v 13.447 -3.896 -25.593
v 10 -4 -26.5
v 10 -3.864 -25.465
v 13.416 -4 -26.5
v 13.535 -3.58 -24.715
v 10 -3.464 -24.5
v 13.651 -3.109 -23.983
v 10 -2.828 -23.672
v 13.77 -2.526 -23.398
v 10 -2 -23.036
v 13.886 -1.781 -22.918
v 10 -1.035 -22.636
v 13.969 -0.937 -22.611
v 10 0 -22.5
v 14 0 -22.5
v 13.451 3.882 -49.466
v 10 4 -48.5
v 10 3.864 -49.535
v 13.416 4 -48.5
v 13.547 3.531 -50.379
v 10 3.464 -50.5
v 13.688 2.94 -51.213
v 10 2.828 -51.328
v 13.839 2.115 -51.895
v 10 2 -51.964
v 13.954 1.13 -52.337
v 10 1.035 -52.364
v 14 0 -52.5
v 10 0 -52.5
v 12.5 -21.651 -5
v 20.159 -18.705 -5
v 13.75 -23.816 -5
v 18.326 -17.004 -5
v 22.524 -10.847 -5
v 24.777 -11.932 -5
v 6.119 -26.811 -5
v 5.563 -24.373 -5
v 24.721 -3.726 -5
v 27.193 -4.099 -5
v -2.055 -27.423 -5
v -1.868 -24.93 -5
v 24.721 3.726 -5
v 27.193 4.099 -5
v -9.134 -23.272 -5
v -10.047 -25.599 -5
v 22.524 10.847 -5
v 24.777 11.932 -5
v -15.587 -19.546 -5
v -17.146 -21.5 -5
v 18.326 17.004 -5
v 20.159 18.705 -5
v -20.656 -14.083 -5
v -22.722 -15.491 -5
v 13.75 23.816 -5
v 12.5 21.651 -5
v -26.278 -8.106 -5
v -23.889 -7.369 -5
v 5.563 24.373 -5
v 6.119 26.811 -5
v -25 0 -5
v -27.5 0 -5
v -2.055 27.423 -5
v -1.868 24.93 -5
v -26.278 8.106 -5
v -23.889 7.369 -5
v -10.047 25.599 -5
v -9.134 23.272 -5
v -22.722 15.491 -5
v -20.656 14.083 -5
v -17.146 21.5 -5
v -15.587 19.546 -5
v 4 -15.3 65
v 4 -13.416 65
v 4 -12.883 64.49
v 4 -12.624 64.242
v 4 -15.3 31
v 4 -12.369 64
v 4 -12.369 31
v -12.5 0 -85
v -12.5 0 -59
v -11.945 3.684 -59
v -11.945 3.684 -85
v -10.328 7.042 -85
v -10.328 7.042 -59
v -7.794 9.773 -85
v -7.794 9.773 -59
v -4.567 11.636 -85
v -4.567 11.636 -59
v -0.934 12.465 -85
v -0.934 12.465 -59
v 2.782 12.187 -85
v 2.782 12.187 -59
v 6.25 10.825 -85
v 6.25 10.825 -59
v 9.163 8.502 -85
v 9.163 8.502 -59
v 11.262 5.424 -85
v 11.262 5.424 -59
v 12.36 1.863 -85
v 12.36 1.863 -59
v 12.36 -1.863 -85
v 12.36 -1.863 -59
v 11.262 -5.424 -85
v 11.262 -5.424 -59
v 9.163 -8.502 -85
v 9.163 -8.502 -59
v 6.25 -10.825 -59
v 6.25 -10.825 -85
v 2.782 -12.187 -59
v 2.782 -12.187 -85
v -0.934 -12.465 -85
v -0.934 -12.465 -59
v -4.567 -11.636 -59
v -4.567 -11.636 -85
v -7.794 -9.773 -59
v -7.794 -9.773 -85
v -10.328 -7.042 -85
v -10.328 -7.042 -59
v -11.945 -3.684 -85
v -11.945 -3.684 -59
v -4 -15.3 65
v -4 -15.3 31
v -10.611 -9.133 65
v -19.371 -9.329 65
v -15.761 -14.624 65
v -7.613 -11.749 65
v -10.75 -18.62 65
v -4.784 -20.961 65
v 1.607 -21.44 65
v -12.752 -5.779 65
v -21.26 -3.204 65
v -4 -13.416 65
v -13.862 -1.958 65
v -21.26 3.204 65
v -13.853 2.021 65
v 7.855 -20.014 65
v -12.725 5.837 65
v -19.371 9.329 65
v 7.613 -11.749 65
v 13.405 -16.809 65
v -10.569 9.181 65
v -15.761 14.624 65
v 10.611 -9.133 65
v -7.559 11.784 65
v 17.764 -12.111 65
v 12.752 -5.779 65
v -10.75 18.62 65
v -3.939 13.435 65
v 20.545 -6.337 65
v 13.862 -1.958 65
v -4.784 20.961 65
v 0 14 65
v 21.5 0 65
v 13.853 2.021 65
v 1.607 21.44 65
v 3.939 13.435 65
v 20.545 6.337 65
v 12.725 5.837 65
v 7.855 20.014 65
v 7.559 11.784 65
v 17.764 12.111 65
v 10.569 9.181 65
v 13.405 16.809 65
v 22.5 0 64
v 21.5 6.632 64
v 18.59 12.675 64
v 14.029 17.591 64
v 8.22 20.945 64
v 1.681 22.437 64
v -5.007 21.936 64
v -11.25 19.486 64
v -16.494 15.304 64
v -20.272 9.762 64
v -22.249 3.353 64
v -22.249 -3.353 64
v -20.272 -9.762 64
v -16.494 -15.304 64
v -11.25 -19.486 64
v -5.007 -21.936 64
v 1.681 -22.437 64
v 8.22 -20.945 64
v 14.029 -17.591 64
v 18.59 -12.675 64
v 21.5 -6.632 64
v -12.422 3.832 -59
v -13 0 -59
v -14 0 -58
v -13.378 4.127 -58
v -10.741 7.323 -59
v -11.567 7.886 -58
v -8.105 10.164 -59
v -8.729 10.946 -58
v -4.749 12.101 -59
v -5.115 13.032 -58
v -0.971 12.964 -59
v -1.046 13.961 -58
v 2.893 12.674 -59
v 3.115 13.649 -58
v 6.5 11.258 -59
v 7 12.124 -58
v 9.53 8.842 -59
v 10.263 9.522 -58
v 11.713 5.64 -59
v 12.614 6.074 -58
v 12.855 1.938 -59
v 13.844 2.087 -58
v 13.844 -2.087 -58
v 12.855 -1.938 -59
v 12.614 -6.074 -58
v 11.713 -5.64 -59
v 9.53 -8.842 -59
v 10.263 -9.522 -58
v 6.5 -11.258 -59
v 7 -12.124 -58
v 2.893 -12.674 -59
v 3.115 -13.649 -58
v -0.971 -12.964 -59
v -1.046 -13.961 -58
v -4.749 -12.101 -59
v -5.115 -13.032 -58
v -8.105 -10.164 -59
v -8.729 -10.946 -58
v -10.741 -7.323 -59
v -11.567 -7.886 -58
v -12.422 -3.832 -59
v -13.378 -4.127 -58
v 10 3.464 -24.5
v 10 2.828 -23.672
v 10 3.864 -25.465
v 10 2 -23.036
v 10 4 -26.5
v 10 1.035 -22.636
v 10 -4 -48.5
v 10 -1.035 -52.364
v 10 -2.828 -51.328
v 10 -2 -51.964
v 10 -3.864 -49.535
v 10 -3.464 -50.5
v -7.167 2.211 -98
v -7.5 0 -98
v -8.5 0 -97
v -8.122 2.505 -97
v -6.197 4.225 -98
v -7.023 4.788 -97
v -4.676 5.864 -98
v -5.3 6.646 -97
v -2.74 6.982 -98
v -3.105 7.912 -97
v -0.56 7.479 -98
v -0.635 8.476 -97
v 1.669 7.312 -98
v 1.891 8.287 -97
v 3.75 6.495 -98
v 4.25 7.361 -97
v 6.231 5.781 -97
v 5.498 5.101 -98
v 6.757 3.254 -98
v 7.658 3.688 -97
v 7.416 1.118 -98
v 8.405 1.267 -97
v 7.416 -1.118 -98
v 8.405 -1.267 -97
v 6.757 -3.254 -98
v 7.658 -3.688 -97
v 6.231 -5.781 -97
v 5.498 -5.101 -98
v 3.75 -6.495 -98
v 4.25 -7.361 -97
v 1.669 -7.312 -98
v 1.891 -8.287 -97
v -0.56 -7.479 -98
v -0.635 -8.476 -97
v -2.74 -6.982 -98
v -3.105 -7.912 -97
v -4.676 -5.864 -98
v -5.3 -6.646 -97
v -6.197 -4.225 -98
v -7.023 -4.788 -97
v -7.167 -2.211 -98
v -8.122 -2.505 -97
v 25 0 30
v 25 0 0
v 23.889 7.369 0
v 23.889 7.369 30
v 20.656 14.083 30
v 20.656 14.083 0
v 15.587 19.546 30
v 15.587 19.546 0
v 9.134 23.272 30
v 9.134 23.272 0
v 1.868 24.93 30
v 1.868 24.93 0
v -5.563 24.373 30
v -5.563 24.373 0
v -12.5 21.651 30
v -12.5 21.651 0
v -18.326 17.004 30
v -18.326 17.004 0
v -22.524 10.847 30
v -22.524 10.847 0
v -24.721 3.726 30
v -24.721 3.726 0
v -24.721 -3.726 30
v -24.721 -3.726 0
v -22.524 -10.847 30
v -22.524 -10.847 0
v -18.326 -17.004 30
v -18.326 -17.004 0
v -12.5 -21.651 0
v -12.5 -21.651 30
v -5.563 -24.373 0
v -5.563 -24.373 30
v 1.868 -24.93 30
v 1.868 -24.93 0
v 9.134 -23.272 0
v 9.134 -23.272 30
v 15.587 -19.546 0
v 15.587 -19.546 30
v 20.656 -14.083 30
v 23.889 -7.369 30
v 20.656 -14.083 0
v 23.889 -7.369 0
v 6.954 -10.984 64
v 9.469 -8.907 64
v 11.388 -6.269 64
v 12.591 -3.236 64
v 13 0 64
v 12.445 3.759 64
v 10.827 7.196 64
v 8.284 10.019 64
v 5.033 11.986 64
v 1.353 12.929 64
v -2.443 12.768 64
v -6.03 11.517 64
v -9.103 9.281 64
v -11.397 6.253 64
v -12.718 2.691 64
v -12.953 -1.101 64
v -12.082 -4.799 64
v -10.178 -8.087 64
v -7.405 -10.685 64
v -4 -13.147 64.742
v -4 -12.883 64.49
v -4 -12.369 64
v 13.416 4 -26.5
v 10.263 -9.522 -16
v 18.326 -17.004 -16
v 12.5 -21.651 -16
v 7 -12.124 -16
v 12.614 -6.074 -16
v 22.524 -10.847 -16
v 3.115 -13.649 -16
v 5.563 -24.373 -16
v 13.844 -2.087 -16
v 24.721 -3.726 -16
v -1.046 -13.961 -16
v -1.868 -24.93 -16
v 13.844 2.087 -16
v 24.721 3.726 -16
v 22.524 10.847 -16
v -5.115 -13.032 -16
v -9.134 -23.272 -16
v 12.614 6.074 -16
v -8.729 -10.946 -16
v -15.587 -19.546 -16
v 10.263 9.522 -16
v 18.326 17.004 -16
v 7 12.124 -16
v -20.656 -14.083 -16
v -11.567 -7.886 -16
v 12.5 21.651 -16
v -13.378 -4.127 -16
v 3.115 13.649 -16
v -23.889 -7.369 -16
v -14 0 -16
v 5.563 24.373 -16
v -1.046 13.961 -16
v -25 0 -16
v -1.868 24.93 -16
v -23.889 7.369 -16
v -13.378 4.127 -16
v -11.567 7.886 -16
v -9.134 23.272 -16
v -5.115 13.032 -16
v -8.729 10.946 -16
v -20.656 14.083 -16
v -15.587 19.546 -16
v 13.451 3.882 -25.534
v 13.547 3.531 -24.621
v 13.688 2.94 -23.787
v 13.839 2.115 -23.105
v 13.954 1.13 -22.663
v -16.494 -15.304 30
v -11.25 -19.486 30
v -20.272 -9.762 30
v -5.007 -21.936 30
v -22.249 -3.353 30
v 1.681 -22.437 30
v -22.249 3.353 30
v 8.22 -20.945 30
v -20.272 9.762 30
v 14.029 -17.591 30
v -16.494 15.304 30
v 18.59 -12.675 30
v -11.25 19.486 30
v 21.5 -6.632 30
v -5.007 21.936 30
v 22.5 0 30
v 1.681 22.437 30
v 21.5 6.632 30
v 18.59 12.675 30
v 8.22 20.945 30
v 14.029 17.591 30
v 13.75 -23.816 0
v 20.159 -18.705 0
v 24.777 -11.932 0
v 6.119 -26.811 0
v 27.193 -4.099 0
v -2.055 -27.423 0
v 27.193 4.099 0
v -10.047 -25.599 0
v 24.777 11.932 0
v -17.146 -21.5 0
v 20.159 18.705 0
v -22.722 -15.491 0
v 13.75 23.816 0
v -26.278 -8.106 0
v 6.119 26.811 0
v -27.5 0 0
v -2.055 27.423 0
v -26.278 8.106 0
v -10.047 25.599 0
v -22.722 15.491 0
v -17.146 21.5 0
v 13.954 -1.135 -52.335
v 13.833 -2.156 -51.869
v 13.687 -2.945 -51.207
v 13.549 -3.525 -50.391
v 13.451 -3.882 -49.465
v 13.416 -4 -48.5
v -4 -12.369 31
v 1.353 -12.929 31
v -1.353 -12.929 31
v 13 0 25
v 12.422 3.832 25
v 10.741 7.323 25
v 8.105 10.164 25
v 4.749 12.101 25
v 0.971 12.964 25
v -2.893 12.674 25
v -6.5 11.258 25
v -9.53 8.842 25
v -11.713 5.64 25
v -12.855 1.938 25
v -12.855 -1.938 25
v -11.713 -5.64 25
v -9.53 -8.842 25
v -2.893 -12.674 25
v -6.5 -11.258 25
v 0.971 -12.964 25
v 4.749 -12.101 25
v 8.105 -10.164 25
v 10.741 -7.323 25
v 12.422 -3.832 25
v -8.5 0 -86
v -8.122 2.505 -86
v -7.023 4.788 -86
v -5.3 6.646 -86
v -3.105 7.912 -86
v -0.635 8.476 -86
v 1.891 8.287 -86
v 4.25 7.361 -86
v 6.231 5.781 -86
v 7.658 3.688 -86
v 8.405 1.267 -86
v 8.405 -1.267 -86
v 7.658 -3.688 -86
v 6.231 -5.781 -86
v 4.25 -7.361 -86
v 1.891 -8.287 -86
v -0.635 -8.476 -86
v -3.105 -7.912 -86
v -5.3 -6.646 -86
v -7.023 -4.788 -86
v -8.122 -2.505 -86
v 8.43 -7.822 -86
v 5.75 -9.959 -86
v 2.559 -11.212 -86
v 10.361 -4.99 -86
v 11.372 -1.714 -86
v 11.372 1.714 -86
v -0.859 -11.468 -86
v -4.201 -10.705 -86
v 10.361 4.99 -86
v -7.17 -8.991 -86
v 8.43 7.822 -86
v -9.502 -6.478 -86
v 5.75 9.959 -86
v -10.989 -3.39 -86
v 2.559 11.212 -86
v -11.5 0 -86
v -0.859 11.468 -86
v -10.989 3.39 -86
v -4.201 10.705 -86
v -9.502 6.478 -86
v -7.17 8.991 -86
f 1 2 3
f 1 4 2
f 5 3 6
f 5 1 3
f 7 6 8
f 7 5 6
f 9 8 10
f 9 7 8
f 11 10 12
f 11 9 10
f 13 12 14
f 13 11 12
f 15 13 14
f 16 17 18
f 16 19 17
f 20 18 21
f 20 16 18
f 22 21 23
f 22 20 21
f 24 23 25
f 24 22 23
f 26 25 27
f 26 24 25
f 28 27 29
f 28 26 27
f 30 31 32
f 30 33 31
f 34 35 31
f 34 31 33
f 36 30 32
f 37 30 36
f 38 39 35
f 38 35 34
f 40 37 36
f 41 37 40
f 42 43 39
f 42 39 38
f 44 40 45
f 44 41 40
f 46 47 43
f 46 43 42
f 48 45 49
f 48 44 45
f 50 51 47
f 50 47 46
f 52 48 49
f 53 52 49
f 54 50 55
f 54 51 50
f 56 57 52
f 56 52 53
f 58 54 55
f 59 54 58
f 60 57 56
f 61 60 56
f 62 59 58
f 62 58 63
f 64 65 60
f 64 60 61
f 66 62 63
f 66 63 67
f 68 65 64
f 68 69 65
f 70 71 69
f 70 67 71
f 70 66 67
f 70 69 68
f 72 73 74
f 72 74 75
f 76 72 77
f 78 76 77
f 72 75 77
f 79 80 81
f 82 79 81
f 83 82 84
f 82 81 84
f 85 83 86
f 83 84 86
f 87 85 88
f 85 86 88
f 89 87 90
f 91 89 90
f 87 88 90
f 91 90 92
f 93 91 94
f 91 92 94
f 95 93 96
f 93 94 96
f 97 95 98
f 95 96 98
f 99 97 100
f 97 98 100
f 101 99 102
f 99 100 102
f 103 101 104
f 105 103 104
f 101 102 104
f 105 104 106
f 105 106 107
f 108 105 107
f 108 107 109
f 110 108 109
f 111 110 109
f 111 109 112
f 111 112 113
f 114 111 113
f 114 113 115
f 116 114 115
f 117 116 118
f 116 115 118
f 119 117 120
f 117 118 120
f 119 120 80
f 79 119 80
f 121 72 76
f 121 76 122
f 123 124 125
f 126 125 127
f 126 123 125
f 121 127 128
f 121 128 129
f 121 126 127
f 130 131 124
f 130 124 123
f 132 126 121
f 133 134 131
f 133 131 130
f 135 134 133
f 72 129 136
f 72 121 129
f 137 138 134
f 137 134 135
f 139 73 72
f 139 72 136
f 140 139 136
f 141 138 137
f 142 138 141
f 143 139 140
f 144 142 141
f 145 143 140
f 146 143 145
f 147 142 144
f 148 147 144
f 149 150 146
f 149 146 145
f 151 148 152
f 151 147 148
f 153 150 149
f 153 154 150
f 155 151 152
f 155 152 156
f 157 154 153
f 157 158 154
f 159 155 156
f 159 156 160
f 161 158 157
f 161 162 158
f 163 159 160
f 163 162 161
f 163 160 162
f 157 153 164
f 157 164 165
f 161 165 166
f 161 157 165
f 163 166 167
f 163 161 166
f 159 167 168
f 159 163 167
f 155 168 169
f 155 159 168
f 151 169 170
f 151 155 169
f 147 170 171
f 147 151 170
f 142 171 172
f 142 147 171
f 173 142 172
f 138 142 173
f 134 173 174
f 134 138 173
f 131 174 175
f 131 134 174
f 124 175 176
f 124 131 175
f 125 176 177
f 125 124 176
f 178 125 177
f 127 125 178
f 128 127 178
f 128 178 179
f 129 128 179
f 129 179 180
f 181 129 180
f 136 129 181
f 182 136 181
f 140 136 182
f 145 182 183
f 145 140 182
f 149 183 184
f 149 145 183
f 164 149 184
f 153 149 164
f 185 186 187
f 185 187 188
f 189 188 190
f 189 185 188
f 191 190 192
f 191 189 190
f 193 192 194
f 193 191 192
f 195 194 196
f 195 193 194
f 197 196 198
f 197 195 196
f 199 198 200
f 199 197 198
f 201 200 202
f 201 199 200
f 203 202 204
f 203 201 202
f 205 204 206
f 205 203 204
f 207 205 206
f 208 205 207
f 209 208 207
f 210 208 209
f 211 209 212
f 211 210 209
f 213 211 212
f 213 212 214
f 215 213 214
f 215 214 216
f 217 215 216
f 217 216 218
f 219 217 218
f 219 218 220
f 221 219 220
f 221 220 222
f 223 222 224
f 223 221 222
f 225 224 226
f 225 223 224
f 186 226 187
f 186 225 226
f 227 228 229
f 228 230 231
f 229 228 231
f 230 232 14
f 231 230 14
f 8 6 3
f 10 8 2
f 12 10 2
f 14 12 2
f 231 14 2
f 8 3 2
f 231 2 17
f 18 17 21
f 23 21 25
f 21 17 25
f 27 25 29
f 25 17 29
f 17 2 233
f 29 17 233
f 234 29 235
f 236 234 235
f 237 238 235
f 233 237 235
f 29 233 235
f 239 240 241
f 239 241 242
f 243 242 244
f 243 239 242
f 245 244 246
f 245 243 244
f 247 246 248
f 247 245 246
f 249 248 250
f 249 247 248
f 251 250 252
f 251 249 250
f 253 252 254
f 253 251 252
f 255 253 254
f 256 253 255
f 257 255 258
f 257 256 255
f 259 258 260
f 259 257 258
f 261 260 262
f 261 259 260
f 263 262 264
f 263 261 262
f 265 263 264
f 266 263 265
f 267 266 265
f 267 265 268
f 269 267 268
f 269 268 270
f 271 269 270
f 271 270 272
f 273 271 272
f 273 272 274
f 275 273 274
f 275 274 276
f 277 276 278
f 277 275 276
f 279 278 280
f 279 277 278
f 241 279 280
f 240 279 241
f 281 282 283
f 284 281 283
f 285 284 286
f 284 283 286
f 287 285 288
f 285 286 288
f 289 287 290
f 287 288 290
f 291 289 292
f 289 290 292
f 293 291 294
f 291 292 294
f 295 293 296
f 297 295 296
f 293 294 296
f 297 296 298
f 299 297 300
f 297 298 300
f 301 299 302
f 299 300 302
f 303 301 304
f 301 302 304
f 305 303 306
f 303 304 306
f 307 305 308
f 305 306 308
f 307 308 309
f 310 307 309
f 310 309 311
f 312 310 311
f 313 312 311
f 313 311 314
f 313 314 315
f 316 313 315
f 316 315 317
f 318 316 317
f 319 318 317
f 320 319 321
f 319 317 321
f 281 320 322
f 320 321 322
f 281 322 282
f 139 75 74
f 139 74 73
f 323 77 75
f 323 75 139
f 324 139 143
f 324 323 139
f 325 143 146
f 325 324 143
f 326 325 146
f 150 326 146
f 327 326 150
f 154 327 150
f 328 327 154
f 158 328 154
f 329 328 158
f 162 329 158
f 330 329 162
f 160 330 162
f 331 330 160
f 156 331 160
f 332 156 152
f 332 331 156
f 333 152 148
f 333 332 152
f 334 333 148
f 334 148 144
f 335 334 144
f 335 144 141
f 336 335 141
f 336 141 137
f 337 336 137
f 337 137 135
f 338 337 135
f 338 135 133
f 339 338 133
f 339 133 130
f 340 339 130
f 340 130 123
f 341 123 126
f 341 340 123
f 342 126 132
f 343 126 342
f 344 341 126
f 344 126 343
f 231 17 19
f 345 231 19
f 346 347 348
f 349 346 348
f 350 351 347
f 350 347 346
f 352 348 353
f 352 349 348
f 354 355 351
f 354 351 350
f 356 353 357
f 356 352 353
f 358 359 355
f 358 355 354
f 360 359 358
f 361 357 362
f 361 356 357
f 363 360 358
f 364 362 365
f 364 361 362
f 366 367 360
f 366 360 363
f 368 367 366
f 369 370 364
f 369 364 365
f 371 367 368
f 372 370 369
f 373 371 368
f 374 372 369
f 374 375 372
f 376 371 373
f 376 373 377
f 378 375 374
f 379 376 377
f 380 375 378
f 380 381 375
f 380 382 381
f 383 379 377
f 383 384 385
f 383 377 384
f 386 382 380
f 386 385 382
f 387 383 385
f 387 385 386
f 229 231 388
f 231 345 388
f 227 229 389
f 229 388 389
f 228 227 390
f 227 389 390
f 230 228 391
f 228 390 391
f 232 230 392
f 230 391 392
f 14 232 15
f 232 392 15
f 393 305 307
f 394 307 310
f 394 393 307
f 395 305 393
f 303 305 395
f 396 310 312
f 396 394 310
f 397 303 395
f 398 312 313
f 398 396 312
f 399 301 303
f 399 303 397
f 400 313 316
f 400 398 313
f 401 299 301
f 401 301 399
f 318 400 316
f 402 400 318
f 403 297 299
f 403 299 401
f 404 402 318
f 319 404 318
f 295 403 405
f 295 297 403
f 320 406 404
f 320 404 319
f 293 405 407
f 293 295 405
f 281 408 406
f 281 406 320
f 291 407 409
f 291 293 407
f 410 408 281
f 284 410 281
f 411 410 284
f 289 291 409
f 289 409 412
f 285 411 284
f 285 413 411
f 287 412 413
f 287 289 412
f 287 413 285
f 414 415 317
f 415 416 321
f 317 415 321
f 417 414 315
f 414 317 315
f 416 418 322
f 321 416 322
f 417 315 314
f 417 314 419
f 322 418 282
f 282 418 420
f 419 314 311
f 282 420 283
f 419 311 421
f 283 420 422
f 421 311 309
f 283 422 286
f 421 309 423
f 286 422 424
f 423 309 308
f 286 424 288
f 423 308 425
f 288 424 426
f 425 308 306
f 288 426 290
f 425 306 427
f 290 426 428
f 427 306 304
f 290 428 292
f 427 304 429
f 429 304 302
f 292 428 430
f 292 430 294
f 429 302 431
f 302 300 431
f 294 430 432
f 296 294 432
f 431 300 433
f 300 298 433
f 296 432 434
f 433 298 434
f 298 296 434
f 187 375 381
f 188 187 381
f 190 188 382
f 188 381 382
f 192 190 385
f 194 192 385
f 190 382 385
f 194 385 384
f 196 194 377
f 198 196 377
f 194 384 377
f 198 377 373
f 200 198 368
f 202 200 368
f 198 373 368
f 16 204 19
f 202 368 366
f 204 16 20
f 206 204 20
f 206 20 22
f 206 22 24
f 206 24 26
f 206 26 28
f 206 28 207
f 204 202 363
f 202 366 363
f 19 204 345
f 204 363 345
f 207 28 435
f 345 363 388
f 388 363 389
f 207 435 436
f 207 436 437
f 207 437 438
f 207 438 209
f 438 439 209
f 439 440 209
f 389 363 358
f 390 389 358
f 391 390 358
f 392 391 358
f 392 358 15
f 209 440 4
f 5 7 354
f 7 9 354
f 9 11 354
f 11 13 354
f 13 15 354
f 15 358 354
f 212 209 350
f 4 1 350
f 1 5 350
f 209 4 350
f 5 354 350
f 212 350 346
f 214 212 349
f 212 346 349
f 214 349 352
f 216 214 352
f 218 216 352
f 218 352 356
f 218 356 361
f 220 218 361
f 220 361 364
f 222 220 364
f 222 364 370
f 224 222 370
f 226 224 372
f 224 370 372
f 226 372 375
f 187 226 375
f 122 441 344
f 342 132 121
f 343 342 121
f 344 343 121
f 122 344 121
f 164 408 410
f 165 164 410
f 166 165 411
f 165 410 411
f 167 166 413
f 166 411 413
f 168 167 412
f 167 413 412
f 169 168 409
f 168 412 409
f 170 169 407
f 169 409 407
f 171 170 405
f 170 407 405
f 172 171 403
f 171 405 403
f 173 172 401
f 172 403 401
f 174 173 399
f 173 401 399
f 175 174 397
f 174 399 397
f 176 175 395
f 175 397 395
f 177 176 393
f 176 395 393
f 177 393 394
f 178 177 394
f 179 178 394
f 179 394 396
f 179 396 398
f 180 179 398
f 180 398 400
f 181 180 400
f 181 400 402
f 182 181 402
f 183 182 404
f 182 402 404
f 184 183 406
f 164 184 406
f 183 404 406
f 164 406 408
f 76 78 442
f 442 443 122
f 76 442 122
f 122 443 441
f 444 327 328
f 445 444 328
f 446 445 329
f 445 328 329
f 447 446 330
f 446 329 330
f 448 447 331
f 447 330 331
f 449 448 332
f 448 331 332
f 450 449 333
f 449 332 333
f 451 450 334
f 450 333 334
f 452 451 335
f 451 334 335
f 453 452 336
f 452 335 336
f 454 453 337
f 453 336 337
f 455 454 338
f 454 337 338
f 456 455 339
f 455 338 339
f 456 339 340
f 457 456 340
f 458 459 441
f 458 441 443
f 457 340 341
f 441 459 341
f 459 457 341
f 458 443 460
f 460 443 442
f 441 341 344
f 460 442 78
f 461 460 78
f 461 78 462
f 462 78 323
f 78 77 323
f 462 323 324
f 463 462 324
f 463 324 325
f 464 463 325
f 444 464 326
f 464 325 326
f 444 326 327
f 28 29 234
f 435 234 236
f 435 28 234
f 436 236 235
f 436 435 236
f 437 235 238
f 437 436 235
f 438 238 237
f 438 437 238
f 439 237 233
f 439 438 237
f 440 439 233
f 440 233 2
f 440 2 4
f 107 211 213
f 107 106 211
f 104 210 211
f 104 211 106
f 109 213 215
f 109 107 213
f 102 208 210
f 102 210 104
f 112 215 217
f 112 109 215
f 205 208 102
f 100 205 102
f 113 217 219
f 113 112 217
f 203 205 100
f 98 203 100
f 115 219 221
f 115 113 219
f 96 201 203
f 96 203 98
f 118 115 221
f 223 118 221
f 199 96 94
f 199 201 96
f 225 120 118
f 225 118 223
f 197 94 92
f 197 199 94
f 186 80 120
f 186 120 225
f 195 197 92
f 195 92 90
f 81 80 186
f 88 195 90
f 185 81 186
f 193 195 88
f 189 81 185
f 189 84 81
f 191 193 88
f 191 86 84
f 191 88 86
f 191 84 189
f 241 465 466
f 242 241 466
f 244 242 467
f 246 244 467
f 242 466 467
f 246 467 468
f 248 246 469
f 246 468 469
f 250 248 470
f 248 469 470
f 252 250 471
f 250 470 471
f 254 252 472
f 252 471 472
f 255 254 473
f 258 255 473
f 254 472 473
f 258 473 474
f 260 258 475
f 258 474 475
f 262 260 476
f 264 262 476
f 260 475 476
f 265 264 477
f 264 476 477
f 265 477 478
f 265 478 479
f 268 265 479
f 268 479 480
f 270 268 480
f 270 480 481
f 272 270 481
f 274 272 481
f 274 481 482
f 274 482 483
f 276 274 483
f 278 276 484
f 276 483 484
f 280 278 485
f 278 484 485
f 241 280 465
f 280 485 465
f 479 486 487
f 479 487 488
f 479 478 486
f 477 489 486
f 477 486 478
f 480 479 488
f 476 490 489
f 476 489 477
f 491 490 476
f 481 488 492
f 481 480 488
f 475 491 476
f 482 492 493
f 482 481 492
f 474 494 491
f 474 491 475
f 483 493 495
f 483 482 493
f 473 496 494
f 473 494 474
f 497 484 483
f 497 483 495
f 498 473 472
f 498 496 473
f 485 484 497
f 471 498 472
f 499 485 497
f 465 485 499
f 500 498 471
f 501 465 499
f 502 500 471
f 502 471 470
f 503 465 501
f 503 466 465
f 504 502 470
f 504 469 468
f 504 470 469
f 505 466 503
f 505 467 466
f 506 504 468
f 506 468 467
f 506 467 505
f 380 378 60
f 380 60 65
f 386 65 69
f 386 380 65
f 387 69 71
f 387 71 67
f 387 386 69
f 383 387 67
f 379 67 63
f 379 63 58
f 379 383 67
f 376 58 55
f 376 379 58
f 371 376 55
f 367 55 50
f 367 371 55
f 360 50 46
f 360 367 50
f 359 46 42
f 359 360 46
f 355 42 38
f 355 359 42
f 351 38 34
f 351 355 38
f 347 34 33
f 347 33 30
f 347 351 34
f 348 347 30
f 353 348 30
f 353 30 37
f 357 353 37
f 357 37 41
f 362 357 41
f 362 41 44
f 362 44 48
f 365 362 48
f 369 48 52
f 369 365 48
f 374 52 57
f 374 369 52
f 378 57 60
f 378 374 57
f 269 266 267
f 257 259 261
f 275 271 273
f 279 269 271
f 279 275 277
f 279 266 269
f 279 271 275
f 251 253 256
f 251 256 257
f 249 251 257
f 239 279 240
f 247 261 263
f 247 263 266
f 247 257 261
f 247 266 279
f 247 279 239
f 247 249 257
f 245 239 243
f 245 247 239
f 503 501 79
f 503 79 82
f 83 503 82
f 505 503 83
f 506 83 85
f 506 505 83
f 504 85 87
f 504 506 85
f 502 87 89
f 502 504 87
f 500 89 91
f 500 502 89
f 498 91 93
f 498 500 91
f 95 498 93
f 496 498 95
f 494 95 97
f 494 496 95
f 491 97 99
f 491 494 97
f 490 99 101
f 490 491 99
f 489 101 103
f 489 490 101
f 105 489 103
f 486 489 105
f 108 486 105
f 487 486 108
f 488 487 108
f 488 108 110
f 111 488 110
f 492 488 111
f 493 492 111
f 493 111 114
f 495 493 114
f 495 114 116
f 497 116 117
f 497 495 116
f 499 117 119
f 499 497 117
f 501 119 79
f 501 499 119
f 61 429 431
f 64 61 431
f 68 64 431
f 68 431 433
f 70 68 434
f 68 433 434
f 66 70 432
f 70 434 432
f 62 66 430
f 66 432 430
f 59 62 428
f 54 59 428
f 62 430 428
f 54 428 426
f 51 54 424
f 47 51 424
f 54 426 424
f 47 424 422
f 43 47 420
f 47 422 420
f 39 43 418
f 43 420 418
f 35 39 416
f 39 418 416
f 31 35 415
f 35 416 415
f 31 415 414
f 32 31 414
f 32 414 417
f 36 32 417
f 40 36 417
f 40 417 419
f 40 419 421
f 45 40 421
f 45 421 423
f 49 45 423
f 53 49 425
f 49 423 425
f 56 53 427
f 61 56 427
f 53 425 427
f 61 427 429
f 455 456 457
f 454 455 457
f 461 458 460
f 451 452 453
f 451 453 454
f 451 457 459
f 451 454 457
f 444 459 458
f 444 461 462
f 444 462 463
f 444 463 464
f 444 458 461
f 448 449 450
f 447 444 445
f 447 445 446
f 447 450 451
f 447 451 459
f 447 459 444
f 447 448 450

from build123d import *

# Parameters (mm, degrees)
SKETCH_1_R               = 25
EXTRUDE_1_DEPTH          = 30
SKETCH_2_R               = 27.5
EXTRUDE_2_DEPTH          = 5
EXTRUDE_START            = 11
SKETCH_3_R               = 25
EXTRUDE_3_DEPTH          = 11
SKETCH_4_R               = 14
EXTRUDE_4_DEPTH          = 43
SKETCH_5_R               = 12.5
EXTRUDE_5_DEPTH          = 27
SKETCH_6_R               = 8.5
EXTRUDE_6_DEPTH          = 12
CUT_EXTRUDE_1_DEPTH      = 4
CUT_EXTRUDE_1_DEPTH_BACK = 4
SKETCH_7_W               = 4
SKETCH_7_H               = 30
FILLET_1_R               = 4
CHAMFER_1_SIZE           = 1
SKETCH_8_R               = 22.5
EXTRUDE_7_DEPTH          = 35
CHAMFER_2_SIZE           = 1
SKETCH_9_R               = 13
CUT_EXTRUDE_2_DEPTH      = 40
CHAMFER_3_SIZE           = 1
CUT_EXTRUDE_3_DEPTH      = 34


with BuildPart() as part:
    # 草图1 → 凸台-拉伸1 (new body)
    with BuildSketch(Plane.XY):
        Circle(SKETCH_1_R)
    extrude(amount=EXTRUDE_1_DEPTH)

    # 草图2 → 凸台-拉伸2 (add)
    with BuildSketch(Plane(origin=(0, 0, 0), x_dir=(-1, 0, 0), z_dir=(0, 0, -1))):
        Circle(SKETCH_2_R)
    extrude(amount=EXTRUDE_2_DEPTH)

    # 草图3 → 凸台-拉伸3 (add)
    with BuildSketch(Plane(origin=(0, 0, -5), x_dir=(-1, 0, 0), z_dir=(0, 0, -1)).offset(EXTRUDE_START)):
        Circle(SKETCH_3_R)
    extrude(amount=-EXTRUDE_3_DEPTH)

    # 草图4 → 凸台-拉伸4 (add)
    with BuildSketch(Plane(origin=(0, 0, -16), x_dir=(-1, 0, 0), z_dir=(0, 0, -1))):
        Circle(SKETCH_4_R)
    extrude(amount=EXTRUDE_4_DEPTH)

    # 草图5 → 凸台-拉伸5 (add)
    with BuildSketch(Plane(origin=(0, 0, -59), x_dir=(-1, 0, 0), z_dir=(0, 0, -1))):
        Circle(SKETCH_5_R)
    extrude(amount=EXTRUDE_5_DEPTH)

    # 草图6 → 凸台-拉伸6 (add)
    with BuildSketch(Plane(origin=(0, 0, -86), x_dir=(-1, 0, 0), z_dir=(0, 0, -1))):
        Circle(SKETCH_6_R)
    extrude(amount=EXTRUDE_6_DEPTH)

    # 草图7 → 切除-拉伸1 (cut, two sides: drawn at the far end of the back side and taken through both)
    with BuildSketch(Plane(origin=(0, 0, 0), x_dir=(1, 0, 0), z_dir=(0, 1, 0)).offset(-CUT_EXTRUDE_1_DEPTH_BACK)):
        with Locations((12, 37.5)):
            Rectangle(SKETCH_7_W, SKETCH_7_H)
    extrude(amount=CUT_EXTRUDE_1_DEPTH + CUT_EXTRUDE_1_DEPTH_BACK, mode=Mode.SUBTRACT)

    # 圆角1
    fillet_1_edges = [part.edges().sort_by_distance(p)[0] for p in [
        (11.708203932, 4, -22.5),
        (11.708203932, -4, -22.5),
        (11.708203932, -4, -52.5),
        (11.708203932, 4, -52.5),
    ]]
    fillet(fillet_1_edges, radius=FILLET_1_R - 0.0001)  # a hair under: the kernel refuses the full size

    # 倒角1
    chamfer_1_edges = [part.edges().sort_by_distance(p)[0] for p in [
        (14, 0, -59),
        (12.5, 0, -86),
        (8.5, 0, -98),
    ]]
    chamfer(chamfer_1_edges, length=CHAMFER_1_SIZE)

    # 草图8 → 凸台-拉伸7 (add)
    with BuildSketch(Plane.XY.offset(30)):
        Circle(SKETCH_8_R)
    extrude(amount=EXTRUDE_7_DEPTH)

    # 倒角2
    chamfer_2_edges = [part.edges().sort_by_distance(p)[0] for p in [
        (-22.5, 0, 65),
    ]]
    chamfer(chamfer_2_edges, length=CHAMFER_2_SIZE)

    # 草图9 → 切除-拉伸2 (cut)
    with BuildSketch(Plane.XY.offset(65)):
        Circle(SKETCH_9_R)
    extrude(amount=-CUT_EXTRUDE_2_DEPTH, mode=Mode.SUBTRACT)

    # 倒角3
    chamfer_3_edges = [part.edges().sort_by_distance(p)[0] for p in [
        (-13, 0, 65),
    ]]
    chamfer(chamfer_3_edges, length=CHAMFER_3_SIZE)

    # 草图10 → 切除-拉伸3 (cut)
    with BuildSketch(Plane.XY.offset(65)):
        Polygon((-4, -13), (-4, -8.881570562), (4, -8.881570562), (4, -13), (4, -15.3), (-4, -15.3), align=None)
    extrude(amount=-CUT_EXTRUDE_3_DEPTH, mode=Mode.SUBTRACT)


solid = part.part
